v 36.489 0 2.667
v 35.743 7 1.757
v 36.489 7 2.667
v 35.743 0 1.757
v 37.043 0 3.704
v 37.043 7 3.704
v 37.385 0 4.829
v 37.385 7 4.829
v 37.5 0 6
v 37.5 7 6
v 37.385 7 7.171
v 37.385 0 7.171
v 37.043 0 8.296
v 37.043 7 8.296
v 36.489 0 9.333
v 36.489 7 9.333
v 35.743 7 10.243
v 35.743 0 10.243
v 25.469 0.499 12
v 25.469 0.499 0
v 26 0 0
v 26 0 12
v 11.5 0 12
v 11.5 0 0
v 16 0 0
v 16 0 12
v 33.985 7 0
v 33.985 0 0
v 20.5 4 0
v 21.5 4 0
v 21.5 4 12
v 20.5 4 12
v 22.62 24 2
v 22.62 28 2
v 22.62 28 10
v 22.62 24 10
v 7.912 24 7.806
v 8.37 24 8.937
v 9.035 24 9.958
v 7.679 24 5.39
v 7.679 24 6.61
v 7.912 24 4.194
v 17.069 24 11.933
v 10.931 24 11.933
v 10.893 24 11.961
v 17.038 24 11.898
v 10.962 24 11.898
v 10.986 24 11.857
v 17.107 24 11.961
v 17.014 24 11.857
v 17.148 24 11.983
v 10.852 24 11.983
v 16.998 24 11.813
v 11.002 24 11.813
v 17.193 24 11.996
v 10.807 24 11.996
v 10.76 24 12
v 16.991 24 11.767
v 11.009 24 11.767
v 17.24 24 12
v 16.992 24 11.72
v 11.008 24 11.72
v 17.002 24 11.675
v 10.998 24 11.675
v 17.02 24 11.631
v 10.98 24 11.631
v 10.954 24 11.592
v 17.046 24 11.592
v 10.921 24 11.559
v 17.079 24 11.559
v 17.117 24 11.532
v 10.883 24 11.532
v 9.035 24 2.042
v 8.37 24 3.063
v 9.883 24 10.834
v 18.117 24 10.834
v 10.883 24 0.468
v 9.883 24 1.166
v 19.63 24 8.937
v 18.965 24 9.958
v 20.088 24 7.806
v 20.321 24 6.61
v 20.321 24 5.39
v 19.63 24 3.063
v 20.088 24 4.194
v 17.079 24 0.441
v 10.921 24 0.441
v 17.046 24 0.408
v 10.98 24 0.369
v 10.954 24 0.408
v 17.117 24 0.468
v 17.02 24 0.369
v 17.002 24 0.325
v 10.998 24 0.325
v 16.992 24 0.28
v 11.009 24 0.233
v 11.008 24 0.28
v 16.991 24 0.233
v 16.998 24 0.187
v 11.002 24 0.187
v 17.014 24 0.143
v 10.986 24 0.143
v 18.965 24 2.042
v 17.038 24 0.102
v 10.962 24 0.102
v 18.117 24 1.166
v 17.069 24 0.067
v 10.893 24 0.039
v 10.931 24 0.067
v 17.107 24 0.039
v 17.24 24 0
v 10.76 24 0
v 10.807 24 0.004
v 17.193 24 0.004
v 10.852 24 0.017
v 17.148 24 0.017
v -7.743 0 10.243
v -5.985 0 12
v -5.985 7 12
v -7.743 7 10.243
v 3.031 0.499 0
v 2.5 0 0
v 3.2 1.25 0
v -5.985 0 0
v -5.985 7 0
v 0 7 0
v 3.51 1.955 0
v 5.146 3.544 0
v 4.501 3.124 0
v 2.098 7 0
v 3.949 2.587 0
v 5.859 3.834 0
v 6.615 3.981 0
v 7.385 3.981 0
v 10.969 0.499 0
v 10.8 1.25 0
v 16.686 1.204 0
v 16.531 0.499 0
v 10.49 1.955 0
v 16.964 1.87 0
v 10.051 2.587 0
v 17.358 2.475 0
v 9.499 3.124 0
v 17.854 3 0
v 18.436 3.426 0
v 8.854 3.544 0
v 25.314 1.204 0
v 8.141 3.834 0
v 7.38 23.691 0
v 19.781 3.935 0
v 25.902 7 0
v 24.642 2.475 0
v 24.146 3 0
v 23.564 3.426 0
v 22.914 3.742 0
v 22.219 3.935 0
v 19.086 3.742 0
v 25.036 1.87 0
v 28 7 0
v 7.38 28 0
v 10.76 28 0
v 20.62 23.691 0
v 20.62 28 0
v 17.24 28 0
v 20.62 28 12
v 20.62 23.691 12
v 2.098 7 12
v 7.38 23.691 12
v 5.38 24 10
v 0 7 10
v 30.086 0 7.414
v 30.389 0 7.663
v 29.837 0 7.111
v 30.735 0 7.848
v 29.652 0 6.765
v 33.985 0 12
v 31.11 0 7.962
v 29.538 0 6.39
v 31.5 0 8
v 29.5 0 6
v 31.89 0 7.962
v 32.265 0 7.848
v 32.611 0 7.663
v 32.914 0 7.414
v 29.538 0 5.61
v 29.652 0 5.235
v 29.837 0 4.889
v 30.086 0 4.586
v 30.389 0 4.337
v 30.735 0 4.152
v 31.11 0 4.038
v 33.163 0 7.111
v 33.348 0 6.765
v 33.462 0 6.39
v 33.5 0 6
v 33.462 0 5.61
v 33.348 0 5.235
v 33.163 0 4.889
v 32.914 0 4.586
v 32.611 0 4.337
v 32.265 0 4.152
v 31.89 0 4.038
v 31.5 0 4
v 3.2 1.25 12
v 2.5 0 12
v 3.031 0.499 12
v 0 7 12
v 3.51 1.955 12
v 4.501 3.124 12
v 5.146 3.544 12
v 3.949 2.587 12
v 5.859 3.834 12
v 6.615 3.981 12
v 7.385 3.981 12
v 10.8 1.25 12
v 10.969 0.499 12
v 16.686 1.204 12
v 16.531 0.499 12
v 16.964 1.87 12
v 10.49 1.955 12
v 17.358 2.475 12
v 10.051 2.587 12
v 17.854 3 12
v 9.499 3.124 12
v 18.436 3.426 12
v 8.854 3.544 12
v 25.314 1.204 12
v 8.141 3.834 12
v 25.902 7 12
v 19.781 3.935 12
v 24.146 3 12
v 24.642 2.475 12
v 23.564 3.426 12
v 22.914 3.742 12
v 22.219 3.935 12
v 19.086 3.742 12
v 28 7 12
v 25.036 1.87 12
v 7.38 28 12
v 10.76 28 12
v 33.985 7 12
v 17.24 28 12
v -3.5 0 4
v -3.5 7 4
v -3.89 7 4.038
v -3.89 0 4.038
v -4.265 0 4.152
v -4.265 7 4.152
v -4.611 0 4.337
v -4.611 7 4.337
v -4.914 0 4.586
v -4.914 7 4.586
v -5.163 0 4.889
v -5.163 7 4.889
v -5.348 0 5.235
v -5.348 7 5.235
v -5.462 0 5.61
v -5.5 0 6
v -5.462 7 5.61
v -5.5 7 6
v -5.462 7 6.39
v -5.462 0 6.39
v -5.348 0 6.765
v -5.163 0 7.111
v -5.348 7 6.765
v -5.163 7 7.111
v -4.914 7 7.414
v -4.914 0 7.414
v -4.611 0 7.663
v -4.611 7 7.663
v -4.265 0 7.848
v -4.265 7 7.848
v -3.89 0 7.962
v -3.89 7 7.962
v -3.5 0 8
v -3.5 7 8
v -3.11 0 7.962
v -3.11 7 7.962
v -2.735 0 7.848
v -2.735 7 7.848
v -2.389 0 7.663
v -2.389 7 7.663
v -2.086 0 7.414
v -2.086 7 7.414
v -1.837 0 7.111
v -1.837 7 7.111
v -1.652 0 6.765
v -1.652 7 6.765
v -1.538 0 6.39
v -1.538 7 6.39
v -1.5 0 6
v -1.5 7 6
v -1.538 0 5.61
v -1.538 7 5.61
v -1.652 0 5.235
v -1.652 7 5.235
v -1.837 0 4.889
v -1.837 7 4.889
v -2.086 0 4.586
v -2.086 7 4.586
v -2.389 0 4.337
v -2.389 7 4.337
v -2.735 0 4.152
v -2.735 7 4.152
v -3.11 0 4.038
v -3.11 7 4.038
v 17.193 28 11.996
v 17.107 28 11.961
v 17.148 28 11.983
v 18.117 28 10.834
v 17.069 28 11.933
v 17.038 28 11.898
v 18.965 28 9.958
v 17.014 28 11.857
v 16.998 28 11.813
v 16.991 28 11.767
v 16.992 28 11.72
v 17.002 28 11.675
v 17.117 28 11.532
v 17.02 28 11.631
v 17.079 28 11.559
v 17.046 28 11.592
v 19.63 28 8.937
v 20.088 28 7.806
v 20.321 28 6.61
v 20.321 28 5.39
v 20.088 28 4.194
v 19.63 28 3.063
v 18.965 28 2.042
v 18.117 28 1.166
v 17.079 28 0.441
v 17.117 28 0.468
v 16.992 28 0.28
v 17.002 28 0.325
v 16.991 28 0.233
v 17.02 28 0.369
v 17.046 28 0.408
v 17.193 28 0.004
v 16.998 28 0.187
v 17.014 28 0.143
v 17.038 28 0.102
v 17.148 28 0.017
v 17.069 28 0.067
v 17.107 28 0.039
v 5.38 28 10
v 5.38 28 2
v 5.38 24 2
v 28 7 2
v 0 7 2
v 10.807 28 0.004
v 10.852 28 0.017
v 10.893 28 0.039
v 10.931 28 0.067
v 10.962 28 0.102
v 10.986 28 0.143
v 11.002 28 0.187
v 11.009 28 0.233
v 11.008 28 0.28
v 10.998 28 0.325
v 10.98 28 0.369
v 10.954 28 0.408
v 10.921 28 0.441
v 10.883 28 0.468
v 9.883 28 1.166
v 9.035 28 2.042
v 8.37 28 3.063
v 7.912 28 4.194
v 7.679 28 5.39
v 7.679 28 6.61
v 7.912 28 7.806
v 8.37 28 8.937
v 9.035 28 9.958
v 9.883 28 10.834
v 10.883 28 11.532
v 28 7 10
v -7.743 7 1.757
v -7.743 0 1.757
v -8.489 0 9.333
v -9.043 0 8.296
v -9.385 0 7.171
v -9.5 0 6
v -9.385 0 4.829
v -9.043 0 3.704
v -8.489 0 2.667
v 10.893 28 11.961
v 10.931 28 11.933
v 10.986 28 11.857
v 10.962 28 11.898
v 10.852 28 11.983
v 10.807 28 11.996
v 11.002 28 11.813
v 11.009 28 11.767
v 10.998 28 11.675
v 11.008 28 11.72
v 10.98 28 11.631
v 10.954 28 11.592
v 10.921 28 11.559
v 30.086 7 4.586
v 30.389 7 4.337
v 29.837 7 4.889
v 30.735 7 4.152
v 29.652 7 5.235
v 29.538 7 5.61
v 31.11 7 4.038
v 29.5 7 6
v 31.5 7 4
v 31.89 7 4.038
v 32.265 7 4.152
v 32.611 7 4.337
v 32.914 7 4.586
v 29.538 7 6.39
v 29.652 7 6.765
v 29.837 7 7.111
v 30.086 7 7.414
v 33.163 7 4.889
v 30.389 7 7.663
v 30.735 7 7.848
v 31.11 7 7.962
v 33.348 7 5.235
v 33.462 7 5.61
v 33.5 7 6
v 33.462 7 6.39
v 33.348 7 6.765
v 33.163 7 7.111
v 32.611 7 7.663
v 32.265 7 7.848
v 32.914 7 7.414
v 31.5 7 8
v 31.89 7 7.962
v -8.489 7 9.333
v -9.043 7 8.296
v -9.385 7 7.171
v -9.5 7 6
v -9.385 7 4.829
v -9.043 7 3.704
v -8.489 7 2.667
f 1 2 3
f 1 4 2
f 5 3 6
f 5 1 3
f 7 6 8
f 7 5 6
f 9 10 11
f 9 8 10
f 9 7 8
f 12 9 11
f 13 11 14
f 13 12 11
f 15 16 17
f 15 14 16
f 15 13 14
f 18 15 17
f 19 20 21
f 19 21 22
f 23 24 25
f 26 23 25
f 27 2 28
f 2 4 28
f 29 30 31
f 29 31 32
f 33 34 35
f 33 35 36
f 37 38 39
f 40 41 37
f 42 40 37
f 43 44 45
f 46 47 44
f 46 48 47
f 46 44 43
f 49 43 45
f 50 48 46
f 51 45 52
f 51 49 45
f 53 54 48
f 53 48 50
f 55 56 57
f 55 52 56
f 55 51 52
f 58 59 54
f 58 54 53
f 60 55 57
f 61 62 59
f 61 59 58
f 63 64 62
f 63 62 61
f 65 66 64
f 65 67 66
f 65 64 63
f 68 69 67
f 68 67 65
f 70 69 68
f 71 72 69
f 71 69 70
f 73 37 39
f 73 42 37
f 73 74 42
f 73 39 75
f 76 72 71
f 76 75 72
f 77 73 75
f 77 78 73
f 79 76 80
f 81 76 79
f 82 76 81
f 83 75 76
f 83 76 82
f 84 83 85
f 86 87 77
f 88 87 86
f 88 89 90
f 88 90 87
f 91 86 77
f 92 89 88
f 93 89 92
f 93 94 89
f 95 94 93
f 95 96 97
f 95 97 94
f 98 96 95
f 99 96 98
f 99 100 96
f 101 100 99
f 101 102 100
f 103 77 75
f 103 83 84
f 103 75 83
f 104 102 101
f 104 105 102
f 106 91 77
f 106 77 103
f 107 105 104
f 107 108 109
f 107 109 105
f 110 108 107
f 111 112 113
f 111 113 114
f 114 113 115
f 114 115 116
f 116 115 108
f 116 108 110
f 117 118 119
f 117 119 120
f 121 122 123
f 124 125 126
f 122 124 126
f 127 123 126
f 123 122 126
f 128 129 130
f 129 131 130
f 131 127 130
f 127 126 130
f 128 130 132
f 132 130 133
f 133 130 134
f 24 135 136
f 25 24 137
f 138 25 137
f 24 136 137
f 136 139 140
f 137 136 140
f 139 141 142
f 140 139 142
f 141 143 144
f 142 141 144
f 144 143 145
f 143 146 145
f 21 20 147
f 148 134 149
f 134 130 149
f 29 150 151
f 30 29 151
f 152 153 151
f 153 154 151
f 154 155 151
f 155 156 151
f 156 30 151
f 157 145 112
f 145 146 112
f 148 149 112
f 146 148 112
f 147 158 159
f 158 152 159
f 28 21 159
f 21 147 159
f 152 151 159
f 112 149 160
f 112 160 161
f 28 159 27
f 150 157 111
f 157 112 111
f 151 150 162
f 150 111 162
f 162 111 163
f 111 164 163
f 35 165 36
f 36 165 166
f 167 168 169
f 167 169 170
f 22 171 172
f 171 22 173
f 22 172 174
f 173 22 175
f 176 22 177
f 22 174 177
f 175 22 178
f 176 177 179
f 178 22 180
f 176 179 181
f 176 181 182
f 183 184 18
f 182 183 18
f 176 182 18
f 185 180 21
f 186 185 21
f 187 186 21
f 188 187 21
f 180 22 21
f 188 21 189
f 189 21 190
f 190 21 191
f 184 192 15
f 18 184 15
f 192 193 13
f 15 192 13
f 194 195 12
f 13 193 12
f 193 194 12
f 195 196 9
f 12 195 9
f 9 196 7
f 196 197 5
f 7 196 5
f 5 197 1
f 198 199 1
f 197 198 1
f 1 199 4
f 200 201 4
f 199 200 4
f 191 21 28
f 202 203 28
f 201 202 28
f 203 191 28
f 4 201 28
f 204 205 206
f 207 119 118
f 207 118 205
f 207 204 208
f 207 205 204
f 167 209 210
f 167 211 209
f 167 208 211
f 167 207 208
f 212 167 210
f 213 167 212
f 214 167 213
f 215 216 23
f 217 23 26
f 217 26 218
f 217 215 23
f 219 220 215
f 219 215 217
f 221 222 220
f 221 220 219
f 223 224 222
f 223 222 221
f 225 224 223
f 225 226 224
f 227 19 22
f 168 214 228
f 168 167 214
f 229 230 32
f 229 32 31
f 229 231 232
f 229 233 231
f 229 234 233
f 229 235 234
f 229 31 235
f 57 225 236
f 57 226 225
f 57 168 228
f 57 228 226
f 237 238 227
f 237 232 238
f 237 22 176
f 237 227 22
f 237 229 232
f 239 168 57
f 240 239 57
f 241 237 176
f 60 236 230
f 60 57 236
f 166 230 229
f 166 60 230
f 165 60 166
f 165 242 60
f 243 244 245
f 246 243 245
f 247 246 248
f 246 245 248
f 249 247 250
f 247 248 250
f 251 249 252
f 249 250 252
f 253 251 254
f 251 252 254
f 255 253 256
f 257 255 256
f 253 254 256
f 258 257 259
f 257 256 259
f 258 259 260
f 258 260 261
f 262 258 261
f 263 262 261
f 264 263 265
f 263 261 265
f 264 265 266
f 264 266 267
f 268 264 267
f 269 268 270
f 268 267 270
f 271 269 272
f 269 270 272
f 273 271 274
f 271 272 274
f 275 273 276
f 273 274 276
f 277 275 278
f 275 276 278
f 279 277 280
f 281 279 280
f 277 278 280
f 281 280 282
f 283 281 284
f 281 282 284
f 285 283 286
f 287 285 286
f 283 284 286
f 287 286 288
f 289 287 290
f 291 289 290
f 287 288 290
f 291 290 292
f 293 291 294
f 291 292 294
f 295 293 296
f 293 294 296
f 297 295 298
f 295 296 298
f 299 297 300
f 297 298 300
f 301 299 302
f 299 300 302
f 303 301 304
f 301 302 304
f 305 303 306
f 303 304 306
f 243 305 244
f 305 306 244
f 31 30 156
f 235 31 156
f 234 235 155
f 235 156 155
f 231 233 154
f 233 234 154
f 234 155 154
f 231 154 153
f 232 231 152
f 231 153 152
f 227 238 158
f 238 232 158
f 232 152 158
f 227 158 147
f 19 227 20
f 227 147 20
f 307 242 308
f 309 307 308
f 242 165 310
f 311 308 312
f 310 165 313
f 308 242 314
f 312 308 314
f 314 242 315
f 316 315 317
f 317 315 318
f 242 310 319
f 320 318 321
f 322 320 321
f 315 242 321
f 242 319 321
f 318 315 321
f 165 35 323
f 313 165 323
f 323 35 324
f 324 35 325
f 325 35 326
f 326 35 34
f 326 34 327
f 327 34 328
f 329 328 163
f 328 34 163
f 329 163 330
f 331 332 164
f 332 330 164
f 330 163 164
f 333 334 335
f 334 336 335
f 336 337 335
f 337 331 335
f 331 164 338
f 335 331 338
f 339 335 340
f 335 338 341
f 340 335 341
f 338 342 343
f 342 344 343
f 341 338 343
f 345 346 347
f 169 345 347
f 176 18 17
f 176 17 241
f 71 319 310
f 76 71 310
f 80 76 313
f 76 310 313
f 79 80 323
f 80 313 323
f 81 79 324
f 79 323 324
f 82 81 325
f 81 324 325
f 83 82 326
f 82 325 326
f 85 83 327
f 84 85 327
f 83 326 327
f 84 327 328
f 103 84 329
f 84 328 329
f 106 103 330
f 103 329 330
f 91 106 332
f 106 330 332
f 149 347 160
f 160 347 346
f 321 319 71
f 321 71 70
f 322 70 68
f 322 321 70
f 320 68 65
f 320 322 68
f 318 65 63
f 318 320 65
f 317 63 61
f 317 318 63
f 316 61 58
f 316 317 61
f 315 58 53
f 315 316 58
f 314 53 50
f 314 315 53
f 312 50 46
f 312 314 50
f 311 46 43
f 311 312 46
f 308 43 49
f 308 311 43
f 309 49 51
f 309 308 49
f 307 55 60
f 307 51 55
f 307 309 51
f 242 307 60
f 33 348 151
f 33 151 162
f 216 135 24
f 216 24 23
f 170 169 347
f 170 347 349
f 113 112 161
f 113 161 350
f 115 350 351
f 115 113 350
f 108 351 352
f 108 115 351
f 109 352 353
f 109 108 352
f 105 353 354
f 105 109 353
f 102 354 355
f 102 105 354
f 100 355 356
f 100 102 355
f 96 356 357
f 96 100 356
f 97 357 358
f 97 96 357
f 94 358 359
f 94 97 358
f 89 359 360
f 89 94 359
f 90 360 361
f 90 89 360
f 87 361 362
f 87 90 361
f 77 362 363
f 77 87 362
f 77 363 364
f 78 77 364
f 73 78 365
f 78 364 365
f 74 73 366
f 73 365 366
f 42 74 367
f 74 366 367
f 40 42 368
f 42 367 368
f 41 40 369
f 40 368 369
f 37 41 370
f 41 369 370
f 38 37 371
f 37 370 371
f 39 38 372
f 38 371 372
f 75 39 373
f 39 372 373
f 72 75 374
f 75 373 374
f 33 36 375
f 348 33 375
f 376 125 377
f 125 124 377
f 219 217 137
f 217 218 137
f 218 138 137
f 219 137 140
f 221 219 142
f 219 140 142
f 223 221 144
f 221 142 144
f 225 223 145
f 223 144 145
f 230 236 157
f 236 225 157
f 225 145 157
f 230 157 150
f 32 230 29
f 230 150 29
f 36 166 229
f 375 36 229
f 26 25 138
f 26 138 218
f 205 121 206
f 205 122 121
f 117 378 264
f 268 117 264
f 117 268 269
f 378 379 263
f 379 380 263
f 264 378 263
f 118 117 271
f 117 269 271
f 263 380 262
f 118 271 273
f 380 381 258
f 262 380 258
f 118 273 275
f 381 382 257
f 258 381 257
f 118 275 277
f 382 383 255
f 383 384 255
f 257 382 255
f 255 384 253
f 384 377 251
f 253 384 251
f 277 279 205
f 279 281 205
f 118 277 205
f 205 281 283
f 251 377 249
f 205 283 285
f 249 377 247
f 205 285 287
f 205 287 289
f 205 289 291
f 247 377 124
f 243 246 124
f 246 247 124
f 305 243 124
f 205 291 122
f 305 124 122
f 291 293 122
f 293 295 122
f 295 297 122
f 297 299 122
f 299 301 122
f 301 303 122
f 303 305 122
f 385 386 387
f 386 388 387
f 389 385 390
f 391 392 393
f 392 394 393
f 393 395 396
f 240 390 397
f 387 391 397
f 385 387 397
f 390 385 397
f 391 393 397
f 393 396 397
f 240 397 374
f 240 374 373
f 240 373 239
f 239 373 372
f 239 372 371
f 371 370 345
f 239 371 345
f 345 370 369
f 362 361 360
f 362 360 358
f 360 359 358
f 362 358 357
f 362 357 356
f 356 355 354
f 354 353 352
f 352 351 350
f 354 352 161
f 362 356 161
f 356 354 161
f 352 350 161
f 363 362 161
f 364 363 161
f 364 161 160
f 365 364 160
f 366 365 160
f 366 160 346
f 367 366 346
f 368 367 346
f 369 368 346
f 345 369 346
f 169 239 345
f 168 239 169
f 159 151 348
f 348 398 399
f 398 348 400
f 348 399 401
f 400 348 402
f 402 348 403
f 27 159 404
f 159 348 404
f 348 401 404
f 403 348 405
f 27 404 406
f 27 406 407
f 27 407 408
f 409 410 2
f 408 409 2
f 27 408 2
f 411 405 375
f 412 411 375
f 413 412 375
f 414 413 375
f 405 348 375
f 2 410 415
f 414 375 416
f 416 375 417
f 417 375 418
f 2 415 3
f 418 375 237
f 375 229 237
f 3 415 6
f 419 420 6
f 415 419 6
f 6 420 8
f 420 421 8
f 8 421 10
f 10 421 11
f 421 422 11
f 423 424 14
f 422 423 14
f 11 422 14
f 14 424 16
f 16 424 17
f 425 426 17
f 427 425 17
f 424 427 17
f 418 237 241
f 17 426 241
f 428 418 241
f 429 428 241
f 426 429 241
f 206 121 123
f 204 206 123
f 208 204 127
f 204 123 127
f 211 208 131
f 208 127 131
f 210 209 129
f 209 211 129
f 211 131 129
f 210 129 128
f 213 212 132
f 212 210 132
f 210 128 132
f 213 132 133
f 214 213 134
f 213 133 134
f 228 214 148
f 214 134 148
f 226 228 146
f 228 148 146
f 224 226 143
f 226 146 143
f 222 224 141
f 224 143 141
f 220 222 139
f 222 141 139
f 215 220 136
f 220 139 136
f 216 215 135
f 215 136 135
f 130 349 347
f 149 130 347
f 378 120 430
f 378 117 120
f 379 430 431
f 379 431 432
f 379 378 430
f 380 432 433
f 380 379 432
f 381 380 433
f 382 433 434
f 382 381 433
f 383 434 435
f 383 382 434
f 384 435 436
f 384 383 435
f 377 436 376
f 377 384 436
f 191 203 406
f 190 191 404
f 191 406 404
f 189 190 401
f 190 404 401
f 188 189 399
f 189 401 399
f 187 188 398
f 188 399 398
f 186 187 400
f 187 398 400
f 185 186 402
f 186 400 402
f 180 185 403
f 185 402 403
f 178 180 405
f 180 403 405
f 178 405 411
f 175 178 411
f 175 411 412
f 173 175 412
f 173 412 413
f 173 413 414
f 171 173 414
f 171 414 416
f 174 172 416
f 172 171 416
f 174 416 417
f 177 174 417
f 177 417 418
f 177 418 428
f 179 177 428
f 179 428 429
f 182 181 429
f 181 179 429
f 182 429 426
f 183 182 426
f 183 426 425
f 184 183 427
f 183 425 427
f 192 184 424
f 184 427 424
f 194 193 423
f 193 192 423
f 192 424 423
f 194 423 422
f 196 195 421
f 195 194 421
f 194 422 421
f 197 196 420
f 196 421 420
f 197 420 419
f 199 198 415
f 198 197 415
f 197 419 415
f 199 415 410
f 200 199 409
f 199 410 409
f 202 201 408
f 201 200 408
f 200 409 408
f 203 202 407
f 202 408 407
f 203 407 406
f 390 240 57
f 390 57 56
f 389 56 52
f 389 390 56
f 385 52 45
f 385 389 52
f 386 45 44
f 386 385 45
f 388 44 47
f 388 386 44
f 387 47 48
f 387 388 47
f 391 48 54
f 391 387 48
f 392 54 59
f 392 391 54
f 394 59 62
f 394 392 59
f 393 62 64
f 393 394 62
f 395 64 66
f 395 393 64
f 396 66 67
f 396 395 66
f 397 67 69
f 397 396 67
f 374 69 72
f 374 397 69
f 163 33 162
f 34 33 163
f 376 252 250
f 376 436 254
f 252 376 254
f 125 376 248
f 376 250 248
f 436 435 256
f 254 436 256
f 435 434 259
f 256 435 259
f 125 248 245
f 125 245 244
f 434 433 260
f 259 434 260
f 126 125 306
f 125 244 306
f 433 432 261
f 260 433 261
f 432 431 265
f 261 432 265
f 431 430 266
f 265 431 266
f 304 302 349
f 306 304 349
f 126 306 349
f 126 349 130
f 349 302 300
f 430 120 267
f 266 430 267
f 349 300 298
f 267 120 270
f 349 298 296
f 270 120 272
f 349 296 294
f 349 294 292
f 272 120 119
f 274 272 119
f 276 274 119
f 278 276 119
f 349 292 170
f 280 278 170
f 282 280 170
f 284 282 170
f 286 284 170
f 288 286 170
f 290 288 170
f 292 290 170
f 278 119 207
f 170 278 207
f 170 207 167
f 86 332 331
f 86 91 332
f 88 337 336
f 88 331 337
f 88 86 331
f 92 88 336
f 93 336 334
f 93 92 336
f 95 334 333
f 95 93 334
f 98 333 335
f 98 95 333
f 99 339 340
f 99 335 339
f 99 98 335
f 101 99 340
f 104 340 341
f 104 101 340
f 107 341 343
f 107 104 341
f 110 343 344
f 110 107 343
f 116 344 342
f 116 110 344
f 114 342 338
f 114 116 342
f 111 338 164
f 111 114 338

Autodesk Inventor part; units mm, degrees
ref_plane "YZ Plane" through (0, 0, 0) normal (1, 0, 0) x (0, 1, 0)
ref_plane "XZ Plane" through (0, 0, 0) normal (0, 1, 0) x (-1, 0, 0)
sketch "Sketch1" plane through (0, 0, 0) normal (0, 0, 1) x (1, 0, 0)
  line L0 (0, 0) -> (28, 0)
  line L1 (28, 0) -> (28, 28)
  line L2 (28, 28) -> (0, 28)
  line L3 (0, 28) -> (0, 0)
  circle A0 centre (7, 0) radius 4
  circle A1 centre (21, 0) radius 4 construction
  line L4 (21, 0) -> (23, 0) construction
  line L5 (20.5, 0) -> (21.5, 0) construction
  line L6 (20.5, -4) -> (21.5, -4)
  line L7 (21.5, 4) -> (20.5, 4)
  arc A2 (20.5, 4) -> (20.5, -4) centre (20.5, 0) ccw
  arc A3 (21.5, -4) -> (21.5, 4) centre (21.5, 0) ccw
  point P0 (3, 0)
  point P1 (11, 0)
  point P2 (17, 0)
  point P3 (25, 0)
  point P4 (21, 0)
  point P5 (16.5, 0)
  point P6 (25.5, 0)
  dimension "d0" = 28
  dimension "d1" = 28
  dimension "d2" = 8
  dimension "d3" = 8
  dimension "d4" = 14
  dimension "d5" = 7
  dimension "d6" = 7
  dimension "d41" = 1
extrude "Extrusion1" add sketch "Sketch1" along normal blind 12 contours L3 L2 L1 L0 A3 L7 A2 A0
chamfer "Chamfer1" distance 0.5 angle 45 4 edges at (3, 0, 6) (11, 0, 6) (16.5, 0, 6) (25.5, 0, 6)
sketch "Sketch2" plane through (0, 28, 0) normal (0, 1, 0) x (1, 0, 0)
  circle A0 centre (14, -6) radius 6.35
  line L0 (28, 0) -> (0, 0) projected
  line L1 (28, 0) -> (28, -12) projected
  point P0 (14, 0)
  point P1 (28, -6)
  point P2 (16.0791, 0)
  point P3 (11.9209, 0)
  dimension "d12" = 12.7
extrude "Extrusion2" cut sketch "Sketch2" against normal blind 4 contours A0 L0 picked at (13.6383, -8.0675)
fillet "Fillet1" radius 0.25 4 edges at (11.9209, 26, 0) (16.0791, 26, 0) (11.9209, 26, 12) (16.0791, 26, 12)
ref_plane "Work Plane3" through (14, 0, 0) normal (-1, 0, 0) x (0, 0, 1)
sketch "Sketch5" plane through (0, 0, 0) normal (0, -1, 0) x (1, 0, 0)
  circle A0 centre (-3.5, 6) radius 2
  circle A1 centre (-3.5, 6) radius 3.5
  circle A2 centre (-3.5, 6) radius 6
  line L0 (0, 12) -> (2.5, 12) projected
  line L1 (0, 0) -> (0, 12) projected
  line L2 (0, 0) -> (2.5, 0) projected
  line L3 (0, 0) -> (0, 12) projected
  line L4 (0, 0) -> (-5.9853, 0)
  line L5 (-5.9853, 0) -> (-7.7426, 1.7574)
  line L6 (0, 12) -> (-5.9853, 12)
  line L7 (-5.9853, 12) -> (-7.7426, 10.2426)
  line L8 (0, 0) -> (0, 12) projected
  line L9 (28, 0) -> (28, 12) projected
  line L10 (26, 0) -> (28, 0) projected
  line L11 (26, 12) -> (28, 12) projected
  line L12 (2.5, 12) -> (2.5, 0) projected
  line L13 (26, 0) -> (26, 12) projected
  dimension "d22" = 4
  dimension "d23" = 7
  dimension "d24" = 135
  dimension "d25" = 135
extrude "Extrusion3" add sketch "Sketch5" against normal blind 7 contours A0 | A1 | L1 A2 | L1 L4 A2 | A2 L6 L1 | L4 L5 A2 | A2 L7 L6 picked at (-7.4809, 9.2519)
sketch "Sketch6" plane through (2.5, 0, 0) normal (0, -1, 0) x (1, 0, 0)
  arc A0 (-10.2426, 10.2426) -> (-10.2426, 1.7574) centre (-6, 6) ccw projected
  point P0 (-2.5, 0)
hole "Hole1" at (-3.5, 0, 6) direction (0, 1, 0) diameter 4 end through all
mirror "Mirror2" about plane through (14, 0, 0) normal (-1, 0, 0) of "Extrusion3", "Hole1"
sketch "Sketch7" plane through (0, 0, 12) normal (0, 0, 1) x (1, 0, 0)
  line L0 (17.24, 24) -> (10.76, 24) projected
  line L1 (17.1173, 24) -> (17.24, 24) projected
  line L2 (17.1173, 24) -> (17.1173, 24) projected
  line L3 (17.24, 24) -> (17.1173, 24) projected
  line L4 (10.76, 24) -> (17.24, 24) projected
  line L5 (10.8827, 24) -> (10.76, 24) projected
  line L6 (10.8827, 24) -> (10.8827, 24) projected
  line L7 (10.76, 24) -> (10.8827, 24) projected
  line L8 (17.1173, 24) -> (20.35, 24) projected
  line L9 (7.65, 24) -> (10.8827, 24) projected
  line L10 (28, 28) -> (17.24, 28) projected
  line L11 (22.62, 28) -> (22.62, 24)
  line L12 (28, 7) -> (28, 28) projected
  line L13 (22.62, 24) -> (28, 7)
  line L14 (10.76, 28) -> (0, 28) projected
  line L15 (5.38, 28) -> (5.38, 24)
  line L16 (0, 28) -> (0, 7) projected
  line L17 (5.38, 24) -> (0, 7)
  line L18 (17.24, 24) -> (10.76, 24) projected
  point P0 (0, 0)
extrude "Extrusion4" cut sketch "Sketch7" against normal through all
chamfer "Chamfer2" distance 2 angle 45 8 edges at (22.62, 26, 12) (25.31, 15.5, 12) (22.62, 26, 0) (25.31, 15.5, 0) (2.69, 15.5, 12) (2.69, 15.5, 0) (5.38, 26, 0) (5.38, 26, 12)
equation "\"d1\" = MotorHeight"
equation "\"d5\" = d6"
equation "\"MotorHeight\" = MotorHeightBase"
equation "\"MotorHeightBase\" = 28"
properties part number "Magnet Mount"
